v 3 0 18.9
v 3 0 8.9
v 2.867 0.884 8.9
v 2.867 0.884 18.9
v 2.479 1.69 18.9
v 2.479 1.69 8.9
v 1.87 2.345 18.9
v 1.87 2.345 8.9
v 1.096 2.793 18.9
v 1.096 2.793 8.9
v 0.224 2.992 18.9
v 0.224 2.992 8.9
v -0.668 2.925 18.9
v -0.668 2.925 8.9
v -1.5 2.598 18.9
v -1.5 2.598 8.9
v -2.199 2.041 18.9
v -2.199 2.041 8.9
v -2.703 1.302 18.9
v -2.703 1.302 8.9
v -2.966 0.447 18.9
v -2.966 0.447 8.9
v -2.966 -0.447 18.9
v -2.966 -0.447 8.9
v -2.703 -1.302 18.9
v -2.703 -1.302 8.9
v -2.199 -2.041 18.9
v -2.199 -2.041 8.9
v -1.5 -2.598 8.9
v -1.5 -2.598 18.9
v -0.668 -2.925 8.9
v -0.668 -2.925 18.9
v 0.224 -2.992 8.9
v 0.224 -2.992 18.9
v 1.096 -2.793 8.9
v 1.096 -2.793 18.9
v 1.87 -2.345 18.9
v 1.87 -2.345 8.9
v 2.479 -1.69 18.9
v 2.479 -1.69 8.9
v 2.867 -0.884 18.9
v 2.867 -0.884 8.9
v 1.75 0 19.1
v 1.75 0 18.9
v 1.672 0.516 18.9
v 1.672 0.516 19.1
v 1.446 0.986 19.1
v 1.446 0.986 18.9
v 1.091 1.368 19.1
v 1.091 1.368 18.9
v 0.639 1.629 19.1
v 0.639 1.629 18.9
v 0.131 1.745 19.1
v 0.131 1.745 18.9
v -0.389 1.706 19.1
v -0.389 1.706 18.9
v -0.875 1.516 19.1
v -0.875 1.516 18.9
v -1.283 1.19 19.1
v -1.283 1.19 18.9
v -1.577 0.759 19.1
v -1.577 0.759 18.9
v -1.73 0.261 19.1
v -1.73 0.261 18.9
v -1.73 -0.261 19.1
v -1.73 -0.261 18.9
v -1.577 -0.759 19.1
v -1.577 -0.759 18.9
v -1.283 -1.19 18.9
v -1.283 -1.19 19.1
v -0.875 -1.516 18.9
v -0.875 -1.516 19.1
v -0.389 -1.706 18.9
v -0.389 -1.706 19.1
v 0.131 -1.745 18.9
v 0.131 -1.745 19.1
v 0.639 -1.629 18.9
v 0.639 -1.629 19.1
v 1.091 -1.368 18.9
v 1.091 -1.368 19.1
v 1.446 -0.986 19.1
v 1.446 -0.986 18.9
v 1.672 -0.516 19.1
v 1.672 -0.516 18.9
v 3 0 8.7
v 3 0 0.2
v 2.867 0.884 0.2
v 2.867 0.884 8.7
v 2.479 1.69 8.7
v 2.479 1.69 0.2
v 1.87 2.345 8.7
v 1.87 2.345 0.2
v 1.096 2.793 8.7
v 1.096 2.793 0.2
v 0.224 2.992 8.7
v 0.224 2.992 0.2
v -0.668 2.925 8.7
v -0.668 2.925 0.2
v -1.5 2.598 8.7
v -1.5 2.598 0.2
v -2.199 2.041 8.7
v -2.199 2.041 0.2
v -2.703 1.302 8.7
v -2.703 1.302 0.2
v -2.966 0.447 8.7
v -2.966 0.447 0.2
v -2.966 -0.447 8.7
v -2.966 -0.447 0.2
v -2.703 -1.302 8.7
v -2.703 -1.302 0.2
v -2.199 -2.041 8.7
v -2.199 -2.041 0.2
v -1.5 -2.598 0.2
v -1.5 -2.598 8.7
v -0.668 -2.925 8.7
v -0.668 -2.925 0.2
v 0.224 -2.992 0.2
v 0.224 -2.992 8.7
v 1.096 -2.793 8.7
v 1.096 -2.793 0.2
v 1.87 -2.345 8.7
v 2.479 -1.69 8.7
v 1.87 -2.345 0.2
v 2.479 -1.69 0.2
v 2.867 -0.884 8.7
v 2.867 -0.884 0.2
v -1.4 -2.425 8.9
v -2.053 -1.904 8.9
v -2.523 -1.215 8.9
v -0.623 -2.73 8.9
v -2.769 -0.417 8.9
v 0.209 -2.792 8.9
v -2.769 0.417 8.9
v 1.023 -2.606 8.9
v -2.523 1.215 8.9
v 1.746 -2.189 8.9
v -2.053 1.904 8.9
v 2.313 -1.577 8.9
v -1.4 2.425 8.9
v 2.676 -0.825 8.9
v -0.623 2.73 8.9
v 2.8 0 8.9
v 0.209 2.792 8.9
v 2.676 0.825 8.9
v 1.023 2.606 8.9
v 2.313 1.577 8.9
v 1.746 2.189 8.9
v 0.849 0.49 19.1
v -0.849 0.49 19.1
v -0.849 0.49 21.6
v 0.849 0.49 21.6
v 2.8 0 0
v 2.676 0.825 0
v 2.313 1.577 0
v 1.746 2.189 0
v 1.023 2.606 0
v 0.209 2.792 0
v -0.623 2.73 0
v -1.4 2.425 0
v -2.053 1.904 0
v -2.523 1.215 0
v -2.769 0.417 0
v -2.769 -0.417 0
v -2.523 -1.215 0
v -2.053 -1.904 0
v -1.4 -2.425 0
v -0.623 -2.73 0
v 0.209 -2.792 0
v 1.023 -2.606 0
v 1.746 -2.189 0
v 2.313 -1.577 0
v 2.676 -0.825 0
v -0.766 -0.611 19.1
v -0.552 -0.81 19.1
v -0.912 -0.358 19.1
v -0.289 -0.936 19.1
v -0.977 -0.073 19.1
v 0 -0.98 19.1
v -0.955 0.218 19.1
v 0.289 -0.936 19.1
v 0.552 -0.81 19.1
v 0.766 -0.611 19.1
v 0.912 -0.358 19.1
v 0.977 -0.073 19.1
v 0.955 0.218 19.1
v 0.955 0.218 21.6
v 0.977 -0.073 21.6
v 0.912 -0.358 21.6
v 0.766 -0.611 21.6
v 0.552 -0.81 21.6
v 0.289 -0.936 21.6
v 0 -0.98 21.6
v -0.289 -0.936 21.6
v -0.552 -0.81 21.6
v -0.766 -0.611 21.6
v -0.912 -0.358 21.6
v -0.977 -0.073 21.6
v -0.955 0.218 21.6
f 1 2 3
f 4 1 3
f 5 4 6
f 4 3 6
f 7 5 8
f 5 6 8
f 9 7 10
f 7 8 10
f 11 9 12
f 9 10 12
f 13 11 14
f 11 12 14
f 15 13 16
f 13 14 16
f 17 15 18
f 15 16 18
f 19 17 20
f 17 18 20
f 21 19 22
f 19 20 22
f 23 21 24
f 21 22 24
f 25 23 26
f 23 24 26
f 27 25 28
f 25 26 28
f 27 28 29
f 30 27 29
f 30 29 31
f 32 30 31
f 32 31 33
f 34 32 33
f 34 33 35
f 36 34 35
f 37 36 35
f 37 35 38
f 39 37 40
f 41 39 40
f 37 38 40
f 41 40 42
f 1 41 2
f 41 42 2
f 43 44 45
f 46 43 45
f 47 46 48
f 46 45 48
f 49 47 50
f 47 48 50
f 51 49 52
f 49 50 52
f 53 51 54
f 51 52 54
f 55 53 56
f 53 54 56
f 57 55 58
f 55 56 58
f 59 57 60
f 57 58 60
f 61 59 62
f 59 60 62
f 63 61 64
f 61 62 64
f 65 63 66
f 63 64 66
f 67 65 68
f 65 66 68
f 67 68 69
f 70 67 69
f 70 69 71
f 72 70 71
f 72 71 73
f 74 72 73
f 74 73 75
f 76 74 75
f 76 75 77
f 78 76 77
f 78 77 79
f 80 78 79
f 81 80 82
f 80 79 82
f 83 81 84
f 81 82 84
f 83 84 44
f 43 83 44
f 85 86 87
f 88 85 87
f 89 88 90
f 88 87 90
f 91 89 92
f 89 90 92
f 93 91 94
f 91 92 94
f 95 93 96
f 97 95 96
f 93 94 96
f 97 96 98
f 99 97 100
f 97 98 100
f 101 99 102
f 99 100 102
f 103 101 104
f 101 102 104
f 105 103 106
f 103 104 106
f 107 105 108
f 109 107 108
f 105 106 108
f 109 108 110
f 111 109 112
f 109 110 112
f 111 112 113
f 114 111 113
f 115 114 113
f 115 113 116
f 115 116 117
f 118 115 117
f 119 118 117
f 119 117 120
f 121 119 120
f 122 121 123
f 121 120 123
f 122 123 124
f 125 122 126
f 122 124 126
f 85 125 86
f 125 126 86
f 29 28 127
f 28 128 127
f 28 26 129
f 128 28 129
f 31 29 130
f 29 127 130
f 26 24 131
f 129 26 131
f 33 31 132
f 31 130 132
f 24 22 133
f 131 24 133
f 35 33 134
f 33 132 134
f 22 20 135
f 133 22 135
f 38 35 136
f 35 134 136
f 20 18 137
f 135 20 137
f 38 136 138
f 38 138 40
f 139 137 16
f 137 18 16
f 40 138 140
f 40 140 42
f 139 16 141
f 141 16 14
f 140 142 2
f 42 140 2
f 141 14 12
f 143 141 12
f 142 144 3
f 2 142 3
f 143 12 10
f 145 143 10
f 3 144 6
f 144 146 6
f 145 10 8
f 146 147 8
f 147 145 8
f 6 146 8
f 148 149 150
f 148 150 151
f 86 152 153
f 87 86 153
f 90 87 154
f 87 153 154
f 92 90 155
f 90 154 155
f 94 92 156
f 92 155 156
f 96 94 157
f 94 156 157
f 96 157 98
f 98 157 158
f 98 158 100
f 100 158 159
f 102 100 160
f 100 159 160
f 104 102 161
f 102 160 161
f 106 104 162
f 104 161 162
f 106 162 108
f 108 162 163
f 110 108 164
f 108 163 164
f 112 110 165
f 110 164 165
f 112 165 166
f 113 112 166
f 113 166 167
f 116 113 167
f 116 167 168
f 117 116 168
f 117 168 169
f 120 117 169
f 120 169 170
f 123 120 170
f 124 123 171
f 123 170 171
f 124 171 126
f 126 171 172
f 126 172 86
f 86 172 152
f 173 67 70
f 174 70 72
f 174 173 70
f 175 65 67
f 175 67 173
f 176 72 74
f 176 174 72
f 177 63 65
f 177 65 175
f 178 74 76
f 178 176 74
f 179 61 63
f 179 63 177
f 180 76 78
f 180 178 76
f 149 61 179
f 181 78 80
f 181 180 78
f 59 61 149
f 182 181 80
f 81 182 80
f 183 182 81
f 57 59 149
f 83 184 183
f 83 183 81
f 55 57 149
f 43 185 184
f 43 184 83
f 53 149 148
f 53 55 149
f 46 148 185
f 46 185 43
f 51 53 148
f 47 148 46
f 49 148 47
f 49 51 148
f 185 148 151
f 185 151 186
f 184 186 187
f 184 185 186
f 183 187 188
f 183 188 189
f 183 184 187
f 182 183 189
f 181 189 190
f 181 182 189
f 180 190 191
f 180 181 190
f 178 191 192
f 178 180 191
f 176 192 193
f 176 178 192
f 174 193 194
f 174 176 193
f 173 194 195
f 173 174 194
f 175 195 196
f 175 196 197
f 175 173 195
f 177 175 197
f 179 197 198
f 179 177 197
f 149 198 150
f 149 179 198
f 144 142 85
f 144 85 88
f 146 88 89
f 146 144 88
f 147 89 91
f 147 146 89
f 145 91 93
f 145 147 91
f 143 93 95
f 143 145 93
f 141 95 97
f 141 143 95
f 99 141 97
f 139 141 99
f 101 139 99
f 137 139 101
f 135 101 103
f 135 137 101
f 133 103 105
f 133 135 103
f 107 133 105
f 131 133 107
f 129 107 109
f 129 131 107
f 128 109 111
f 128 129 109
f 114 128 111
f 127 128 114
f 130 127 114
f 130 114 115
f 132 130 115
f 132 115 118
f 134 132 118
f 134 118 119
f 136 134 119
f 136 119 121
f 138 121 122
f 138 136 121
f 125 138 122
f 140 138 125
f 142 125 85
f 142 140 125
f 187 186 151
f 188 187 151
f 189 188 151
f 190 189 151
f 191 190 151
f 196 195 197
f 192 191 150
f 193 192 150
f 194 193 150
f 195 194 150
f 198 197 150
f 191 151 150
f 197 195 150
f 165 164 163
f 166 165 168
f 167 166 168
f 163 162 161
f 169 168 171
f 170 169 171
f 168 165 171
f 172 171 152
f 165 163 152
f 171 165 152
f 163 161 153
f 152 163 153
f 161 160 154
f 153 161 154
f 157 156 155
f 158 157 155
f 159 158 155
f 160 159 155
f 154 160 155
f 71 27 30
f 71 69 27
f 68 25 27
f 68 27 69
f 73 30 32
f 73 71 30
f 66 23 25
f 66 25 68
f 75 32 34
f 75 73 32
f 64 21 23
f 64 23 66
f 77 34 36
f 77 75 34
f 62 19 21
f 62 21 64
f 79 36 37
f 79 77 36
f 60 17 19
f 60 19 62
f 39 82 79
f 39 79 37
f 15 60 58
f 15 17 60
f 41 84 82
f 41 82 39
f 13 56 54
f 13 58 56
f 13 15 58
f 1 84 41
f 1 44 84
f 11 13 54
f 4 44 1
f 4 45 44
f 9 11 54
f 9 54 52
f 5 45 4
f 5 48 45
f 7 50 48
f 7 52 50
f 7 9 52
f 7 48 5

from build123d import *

# Parameters (mm, degrees)
SKETCH1_R           = 3
BOSS_EXTRUDE1_DEPTH = 8.9
CHAMFER1_SIZE       = 0.2
SKETCH2_R           = 3
BOSS_EXTRUDE2_DEPTH = 10
SKETCH3_R           = 1.75
BOSS_EXTRUDE3_DEPTH = 0.2
BOSS_EXTRUDE4_DEPTH = 2.5


with BuildPart() as part:
    # Sketch1 → Boss-Extrude1 (new body)
    with BuildSketch(Plane.XY):
        Circle(SKETCH1_R)
    extrude(amount=BOSS_EXTRUDE1_DEPTH)

    # Chamfer1
    chamfer1_edges = [part.edges().sort_by_distance(p)[0] for p in [
        (-3, 0, 0),
        (-3, 0, 8.9),
    ]]
    chamfer(chamfer1_edges, length=CHAMFER1_SIZE)

    # Sketch2 → Boss-Extrude2 (add)
    with BuildSketch(Plane.XY.offset(8.9)):
        Circle(SKETCH2_R)
    extrude(amount=BOSS_EXTRUDE2_DEPTH)

    # Sketch3 → Boss-Extrude3 (add)
    with BuildSketch(Plane.XY.offset(18.9)):
        Circle(SKETCH3_R)
    extrude(amount=BOSS_EXTRUDE3_DEPTH)

    # Sketch5 → Boss-Extrude4 (add)
    with BuildSketch(Plane.XY.offset(19.1)):
        with BuildLine():
            Line((0, 0.49), (0.848704896, 0.49))
            ThreePointArc((0.848704896, 0.49), (0, -0.98), (-0.848704896, 0.49))
            Line((-0.848704896, 0.49), (0, 0.49))
        make_face()
    extrude(amount=BOSS_EXTRUDE4_DEPTH)


solid = part.part
